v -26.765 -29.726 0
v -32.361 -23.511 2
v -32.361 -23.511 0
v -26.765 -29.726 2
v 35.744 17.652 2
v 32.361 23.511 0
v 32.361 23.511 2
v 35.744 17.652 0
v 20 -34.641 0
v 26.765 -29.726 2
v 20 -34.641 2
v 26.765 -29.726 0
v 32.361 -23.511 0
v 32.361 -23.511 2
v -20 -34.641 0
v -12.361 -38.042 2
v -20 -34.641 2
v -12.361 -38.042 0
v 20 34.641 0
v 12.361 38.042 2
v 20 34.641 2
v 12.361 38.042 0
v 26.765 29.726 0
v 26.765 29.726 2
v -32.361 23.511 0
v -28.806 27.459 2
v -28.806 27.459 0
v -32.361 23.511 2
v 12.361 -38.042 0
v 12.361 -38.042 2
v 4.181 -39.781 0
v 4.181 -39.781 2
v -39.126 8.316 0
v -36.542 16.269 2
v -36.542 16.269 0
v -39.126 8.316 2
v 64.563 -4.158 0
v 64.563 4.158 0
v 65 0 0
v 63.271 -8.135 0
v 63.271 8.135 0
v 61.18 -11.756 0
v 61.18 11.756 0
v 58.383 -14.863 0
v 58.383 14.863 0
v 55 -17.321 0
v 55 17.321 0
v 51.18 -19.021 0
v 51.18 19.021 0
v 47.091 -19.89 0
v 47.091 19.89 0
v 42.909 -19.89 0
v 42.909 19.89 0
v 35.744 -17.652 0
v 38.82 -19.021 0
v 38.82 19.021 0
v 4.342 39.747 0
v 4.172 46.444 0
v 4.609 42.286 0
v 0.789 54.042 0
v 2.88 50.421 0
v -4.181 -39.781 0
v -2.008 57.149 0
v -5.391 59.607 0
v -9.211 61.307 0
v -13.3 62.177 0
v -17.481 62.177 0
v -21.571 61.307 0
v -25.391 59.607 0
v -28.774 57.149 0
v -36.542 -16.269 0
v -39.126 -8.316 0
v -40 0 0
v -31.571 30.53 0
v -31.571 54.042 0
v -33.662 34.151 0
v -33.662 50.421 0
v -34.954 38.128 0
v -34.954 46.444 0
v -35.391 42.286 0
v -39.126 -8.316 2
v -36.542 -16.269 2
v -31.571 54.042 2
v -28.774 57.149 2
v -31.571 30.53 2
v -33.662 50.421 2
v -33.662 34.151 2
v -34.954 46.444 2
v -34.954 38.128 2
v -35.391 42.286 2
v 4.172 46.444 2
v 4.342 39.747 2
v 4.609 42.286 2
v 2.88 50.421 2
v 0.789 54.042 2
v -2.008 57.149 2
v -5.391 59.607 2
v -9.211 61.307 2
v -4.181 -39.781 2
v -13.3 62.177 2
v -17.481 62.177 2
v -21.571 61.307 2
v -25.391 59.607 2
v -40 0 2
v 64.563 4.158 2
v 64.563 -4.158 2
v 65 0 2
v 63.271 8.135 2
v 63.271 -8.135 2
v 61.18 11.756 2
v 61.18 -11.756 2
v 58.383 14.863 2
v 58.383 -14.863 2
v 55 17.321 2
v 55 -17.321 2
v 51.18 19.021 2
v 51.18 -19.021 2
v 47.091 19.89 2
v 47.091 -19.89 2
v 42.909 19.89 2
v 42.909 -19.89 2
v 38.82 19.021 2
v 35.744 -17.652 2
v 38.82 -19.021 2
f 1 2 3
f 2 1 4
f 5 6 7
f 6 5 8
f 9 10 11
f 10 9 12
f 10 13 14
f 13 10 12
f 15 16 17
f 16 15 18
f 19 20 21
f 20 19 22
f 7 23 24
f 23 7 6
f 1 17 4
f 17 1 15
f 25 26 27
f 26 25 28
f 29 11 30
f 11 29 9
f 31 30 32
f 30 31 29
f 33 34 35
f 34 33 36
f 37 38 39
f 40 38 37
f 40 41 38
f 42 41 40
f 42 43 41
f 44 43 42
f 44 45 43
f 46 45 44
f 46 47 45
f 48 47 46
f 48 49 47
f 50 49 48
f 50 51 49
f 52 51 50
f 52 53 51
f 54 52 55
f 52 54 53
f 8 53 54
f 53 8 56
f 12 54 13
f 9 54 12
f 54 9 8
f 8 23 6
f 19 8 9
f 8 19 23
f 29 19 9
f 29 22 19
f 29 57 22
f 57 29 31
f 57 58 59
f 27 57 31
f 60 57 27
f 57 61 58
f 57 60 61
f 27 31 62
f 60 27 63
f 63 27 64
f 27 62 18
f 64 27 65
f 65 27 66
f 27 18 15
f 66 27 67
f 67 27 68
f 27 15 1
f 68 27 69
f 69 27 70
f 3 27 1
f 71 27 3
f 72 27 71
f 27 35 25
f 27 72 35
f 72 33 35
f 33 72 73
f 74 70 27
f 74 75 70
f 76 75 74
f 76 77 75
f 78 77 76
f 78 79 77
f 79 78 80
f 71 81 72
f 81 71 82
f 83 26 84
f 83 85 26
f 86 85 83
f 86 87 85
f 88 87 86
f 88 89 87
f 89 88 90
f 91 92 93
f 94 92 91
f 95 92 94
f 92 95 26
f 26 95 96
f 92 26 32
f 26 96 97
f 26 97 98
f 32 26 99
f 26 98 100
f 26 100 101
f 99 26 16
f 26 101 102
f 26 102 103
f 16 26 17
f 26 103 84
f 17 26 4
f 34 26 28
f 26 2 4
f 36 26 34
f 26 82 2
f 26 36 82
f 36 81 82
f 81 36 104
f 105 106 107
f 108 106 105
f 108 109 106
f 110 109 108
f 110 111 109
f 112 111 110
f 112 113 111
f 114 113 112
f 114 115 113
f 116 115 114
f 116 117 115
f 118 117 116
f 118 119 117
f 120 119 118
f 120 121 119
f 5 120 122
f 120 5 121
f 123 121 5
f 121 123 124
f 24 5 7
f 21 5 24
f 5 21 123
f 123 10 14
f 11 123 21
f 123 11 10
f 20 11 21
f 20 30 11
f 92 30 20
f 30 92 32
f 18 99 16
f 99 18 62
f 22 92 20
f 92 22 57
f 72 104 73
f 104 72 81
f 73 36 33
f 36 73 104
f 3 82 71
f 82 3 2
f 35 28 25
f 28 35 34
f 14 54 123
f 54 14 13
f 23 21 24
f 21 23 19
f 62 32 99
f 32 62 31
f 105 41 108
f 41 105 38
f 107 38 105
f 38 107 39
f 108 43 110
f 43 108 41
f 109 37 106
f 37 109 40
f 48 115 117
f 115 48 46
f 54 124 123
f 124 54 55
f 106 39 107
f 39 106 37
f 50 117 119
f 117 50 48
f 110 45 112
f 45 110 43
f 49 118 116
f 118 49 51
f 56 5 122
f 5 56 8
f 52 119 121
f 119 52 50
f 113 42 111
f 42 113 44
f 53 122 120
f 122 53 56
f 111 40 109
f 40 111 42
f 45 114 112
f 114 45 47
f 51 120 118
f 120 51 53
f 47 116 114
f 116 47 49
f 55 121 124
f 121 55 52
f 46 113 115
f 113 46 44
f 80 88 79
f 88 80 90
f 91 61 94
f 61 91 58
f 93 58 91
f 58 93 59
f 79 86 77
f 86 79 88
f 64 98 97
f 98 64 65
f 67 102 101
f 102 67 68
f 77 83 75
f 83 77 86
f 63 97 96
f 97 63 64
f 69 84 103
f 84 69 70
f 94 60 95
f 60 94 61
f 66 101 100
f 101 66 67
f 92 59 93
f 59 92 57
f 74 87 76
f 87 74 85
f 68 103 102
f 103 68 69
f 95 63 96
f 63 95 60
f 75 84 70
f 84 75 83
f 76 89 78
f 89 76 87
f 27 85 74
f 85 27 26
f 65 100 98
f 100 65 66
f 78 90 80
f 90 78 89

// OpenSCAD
height = 2;
r_head = 40;
r_ear = 20;

ear_offset = 45;
ears_angle = 110;

union() {
    cylinder(h=height, r1=r_head, r2=r_head);
    translate([ear_offset, 0, 0])
        cylinder(h=height, r1=r_ear, r2=r_ear);
    translate([ear_offset * cos(ears_angle), ear_offset * sin(ears_angle), 0])
        cylinder(h=height, r1=r_ear, r2=r_ear);
}
